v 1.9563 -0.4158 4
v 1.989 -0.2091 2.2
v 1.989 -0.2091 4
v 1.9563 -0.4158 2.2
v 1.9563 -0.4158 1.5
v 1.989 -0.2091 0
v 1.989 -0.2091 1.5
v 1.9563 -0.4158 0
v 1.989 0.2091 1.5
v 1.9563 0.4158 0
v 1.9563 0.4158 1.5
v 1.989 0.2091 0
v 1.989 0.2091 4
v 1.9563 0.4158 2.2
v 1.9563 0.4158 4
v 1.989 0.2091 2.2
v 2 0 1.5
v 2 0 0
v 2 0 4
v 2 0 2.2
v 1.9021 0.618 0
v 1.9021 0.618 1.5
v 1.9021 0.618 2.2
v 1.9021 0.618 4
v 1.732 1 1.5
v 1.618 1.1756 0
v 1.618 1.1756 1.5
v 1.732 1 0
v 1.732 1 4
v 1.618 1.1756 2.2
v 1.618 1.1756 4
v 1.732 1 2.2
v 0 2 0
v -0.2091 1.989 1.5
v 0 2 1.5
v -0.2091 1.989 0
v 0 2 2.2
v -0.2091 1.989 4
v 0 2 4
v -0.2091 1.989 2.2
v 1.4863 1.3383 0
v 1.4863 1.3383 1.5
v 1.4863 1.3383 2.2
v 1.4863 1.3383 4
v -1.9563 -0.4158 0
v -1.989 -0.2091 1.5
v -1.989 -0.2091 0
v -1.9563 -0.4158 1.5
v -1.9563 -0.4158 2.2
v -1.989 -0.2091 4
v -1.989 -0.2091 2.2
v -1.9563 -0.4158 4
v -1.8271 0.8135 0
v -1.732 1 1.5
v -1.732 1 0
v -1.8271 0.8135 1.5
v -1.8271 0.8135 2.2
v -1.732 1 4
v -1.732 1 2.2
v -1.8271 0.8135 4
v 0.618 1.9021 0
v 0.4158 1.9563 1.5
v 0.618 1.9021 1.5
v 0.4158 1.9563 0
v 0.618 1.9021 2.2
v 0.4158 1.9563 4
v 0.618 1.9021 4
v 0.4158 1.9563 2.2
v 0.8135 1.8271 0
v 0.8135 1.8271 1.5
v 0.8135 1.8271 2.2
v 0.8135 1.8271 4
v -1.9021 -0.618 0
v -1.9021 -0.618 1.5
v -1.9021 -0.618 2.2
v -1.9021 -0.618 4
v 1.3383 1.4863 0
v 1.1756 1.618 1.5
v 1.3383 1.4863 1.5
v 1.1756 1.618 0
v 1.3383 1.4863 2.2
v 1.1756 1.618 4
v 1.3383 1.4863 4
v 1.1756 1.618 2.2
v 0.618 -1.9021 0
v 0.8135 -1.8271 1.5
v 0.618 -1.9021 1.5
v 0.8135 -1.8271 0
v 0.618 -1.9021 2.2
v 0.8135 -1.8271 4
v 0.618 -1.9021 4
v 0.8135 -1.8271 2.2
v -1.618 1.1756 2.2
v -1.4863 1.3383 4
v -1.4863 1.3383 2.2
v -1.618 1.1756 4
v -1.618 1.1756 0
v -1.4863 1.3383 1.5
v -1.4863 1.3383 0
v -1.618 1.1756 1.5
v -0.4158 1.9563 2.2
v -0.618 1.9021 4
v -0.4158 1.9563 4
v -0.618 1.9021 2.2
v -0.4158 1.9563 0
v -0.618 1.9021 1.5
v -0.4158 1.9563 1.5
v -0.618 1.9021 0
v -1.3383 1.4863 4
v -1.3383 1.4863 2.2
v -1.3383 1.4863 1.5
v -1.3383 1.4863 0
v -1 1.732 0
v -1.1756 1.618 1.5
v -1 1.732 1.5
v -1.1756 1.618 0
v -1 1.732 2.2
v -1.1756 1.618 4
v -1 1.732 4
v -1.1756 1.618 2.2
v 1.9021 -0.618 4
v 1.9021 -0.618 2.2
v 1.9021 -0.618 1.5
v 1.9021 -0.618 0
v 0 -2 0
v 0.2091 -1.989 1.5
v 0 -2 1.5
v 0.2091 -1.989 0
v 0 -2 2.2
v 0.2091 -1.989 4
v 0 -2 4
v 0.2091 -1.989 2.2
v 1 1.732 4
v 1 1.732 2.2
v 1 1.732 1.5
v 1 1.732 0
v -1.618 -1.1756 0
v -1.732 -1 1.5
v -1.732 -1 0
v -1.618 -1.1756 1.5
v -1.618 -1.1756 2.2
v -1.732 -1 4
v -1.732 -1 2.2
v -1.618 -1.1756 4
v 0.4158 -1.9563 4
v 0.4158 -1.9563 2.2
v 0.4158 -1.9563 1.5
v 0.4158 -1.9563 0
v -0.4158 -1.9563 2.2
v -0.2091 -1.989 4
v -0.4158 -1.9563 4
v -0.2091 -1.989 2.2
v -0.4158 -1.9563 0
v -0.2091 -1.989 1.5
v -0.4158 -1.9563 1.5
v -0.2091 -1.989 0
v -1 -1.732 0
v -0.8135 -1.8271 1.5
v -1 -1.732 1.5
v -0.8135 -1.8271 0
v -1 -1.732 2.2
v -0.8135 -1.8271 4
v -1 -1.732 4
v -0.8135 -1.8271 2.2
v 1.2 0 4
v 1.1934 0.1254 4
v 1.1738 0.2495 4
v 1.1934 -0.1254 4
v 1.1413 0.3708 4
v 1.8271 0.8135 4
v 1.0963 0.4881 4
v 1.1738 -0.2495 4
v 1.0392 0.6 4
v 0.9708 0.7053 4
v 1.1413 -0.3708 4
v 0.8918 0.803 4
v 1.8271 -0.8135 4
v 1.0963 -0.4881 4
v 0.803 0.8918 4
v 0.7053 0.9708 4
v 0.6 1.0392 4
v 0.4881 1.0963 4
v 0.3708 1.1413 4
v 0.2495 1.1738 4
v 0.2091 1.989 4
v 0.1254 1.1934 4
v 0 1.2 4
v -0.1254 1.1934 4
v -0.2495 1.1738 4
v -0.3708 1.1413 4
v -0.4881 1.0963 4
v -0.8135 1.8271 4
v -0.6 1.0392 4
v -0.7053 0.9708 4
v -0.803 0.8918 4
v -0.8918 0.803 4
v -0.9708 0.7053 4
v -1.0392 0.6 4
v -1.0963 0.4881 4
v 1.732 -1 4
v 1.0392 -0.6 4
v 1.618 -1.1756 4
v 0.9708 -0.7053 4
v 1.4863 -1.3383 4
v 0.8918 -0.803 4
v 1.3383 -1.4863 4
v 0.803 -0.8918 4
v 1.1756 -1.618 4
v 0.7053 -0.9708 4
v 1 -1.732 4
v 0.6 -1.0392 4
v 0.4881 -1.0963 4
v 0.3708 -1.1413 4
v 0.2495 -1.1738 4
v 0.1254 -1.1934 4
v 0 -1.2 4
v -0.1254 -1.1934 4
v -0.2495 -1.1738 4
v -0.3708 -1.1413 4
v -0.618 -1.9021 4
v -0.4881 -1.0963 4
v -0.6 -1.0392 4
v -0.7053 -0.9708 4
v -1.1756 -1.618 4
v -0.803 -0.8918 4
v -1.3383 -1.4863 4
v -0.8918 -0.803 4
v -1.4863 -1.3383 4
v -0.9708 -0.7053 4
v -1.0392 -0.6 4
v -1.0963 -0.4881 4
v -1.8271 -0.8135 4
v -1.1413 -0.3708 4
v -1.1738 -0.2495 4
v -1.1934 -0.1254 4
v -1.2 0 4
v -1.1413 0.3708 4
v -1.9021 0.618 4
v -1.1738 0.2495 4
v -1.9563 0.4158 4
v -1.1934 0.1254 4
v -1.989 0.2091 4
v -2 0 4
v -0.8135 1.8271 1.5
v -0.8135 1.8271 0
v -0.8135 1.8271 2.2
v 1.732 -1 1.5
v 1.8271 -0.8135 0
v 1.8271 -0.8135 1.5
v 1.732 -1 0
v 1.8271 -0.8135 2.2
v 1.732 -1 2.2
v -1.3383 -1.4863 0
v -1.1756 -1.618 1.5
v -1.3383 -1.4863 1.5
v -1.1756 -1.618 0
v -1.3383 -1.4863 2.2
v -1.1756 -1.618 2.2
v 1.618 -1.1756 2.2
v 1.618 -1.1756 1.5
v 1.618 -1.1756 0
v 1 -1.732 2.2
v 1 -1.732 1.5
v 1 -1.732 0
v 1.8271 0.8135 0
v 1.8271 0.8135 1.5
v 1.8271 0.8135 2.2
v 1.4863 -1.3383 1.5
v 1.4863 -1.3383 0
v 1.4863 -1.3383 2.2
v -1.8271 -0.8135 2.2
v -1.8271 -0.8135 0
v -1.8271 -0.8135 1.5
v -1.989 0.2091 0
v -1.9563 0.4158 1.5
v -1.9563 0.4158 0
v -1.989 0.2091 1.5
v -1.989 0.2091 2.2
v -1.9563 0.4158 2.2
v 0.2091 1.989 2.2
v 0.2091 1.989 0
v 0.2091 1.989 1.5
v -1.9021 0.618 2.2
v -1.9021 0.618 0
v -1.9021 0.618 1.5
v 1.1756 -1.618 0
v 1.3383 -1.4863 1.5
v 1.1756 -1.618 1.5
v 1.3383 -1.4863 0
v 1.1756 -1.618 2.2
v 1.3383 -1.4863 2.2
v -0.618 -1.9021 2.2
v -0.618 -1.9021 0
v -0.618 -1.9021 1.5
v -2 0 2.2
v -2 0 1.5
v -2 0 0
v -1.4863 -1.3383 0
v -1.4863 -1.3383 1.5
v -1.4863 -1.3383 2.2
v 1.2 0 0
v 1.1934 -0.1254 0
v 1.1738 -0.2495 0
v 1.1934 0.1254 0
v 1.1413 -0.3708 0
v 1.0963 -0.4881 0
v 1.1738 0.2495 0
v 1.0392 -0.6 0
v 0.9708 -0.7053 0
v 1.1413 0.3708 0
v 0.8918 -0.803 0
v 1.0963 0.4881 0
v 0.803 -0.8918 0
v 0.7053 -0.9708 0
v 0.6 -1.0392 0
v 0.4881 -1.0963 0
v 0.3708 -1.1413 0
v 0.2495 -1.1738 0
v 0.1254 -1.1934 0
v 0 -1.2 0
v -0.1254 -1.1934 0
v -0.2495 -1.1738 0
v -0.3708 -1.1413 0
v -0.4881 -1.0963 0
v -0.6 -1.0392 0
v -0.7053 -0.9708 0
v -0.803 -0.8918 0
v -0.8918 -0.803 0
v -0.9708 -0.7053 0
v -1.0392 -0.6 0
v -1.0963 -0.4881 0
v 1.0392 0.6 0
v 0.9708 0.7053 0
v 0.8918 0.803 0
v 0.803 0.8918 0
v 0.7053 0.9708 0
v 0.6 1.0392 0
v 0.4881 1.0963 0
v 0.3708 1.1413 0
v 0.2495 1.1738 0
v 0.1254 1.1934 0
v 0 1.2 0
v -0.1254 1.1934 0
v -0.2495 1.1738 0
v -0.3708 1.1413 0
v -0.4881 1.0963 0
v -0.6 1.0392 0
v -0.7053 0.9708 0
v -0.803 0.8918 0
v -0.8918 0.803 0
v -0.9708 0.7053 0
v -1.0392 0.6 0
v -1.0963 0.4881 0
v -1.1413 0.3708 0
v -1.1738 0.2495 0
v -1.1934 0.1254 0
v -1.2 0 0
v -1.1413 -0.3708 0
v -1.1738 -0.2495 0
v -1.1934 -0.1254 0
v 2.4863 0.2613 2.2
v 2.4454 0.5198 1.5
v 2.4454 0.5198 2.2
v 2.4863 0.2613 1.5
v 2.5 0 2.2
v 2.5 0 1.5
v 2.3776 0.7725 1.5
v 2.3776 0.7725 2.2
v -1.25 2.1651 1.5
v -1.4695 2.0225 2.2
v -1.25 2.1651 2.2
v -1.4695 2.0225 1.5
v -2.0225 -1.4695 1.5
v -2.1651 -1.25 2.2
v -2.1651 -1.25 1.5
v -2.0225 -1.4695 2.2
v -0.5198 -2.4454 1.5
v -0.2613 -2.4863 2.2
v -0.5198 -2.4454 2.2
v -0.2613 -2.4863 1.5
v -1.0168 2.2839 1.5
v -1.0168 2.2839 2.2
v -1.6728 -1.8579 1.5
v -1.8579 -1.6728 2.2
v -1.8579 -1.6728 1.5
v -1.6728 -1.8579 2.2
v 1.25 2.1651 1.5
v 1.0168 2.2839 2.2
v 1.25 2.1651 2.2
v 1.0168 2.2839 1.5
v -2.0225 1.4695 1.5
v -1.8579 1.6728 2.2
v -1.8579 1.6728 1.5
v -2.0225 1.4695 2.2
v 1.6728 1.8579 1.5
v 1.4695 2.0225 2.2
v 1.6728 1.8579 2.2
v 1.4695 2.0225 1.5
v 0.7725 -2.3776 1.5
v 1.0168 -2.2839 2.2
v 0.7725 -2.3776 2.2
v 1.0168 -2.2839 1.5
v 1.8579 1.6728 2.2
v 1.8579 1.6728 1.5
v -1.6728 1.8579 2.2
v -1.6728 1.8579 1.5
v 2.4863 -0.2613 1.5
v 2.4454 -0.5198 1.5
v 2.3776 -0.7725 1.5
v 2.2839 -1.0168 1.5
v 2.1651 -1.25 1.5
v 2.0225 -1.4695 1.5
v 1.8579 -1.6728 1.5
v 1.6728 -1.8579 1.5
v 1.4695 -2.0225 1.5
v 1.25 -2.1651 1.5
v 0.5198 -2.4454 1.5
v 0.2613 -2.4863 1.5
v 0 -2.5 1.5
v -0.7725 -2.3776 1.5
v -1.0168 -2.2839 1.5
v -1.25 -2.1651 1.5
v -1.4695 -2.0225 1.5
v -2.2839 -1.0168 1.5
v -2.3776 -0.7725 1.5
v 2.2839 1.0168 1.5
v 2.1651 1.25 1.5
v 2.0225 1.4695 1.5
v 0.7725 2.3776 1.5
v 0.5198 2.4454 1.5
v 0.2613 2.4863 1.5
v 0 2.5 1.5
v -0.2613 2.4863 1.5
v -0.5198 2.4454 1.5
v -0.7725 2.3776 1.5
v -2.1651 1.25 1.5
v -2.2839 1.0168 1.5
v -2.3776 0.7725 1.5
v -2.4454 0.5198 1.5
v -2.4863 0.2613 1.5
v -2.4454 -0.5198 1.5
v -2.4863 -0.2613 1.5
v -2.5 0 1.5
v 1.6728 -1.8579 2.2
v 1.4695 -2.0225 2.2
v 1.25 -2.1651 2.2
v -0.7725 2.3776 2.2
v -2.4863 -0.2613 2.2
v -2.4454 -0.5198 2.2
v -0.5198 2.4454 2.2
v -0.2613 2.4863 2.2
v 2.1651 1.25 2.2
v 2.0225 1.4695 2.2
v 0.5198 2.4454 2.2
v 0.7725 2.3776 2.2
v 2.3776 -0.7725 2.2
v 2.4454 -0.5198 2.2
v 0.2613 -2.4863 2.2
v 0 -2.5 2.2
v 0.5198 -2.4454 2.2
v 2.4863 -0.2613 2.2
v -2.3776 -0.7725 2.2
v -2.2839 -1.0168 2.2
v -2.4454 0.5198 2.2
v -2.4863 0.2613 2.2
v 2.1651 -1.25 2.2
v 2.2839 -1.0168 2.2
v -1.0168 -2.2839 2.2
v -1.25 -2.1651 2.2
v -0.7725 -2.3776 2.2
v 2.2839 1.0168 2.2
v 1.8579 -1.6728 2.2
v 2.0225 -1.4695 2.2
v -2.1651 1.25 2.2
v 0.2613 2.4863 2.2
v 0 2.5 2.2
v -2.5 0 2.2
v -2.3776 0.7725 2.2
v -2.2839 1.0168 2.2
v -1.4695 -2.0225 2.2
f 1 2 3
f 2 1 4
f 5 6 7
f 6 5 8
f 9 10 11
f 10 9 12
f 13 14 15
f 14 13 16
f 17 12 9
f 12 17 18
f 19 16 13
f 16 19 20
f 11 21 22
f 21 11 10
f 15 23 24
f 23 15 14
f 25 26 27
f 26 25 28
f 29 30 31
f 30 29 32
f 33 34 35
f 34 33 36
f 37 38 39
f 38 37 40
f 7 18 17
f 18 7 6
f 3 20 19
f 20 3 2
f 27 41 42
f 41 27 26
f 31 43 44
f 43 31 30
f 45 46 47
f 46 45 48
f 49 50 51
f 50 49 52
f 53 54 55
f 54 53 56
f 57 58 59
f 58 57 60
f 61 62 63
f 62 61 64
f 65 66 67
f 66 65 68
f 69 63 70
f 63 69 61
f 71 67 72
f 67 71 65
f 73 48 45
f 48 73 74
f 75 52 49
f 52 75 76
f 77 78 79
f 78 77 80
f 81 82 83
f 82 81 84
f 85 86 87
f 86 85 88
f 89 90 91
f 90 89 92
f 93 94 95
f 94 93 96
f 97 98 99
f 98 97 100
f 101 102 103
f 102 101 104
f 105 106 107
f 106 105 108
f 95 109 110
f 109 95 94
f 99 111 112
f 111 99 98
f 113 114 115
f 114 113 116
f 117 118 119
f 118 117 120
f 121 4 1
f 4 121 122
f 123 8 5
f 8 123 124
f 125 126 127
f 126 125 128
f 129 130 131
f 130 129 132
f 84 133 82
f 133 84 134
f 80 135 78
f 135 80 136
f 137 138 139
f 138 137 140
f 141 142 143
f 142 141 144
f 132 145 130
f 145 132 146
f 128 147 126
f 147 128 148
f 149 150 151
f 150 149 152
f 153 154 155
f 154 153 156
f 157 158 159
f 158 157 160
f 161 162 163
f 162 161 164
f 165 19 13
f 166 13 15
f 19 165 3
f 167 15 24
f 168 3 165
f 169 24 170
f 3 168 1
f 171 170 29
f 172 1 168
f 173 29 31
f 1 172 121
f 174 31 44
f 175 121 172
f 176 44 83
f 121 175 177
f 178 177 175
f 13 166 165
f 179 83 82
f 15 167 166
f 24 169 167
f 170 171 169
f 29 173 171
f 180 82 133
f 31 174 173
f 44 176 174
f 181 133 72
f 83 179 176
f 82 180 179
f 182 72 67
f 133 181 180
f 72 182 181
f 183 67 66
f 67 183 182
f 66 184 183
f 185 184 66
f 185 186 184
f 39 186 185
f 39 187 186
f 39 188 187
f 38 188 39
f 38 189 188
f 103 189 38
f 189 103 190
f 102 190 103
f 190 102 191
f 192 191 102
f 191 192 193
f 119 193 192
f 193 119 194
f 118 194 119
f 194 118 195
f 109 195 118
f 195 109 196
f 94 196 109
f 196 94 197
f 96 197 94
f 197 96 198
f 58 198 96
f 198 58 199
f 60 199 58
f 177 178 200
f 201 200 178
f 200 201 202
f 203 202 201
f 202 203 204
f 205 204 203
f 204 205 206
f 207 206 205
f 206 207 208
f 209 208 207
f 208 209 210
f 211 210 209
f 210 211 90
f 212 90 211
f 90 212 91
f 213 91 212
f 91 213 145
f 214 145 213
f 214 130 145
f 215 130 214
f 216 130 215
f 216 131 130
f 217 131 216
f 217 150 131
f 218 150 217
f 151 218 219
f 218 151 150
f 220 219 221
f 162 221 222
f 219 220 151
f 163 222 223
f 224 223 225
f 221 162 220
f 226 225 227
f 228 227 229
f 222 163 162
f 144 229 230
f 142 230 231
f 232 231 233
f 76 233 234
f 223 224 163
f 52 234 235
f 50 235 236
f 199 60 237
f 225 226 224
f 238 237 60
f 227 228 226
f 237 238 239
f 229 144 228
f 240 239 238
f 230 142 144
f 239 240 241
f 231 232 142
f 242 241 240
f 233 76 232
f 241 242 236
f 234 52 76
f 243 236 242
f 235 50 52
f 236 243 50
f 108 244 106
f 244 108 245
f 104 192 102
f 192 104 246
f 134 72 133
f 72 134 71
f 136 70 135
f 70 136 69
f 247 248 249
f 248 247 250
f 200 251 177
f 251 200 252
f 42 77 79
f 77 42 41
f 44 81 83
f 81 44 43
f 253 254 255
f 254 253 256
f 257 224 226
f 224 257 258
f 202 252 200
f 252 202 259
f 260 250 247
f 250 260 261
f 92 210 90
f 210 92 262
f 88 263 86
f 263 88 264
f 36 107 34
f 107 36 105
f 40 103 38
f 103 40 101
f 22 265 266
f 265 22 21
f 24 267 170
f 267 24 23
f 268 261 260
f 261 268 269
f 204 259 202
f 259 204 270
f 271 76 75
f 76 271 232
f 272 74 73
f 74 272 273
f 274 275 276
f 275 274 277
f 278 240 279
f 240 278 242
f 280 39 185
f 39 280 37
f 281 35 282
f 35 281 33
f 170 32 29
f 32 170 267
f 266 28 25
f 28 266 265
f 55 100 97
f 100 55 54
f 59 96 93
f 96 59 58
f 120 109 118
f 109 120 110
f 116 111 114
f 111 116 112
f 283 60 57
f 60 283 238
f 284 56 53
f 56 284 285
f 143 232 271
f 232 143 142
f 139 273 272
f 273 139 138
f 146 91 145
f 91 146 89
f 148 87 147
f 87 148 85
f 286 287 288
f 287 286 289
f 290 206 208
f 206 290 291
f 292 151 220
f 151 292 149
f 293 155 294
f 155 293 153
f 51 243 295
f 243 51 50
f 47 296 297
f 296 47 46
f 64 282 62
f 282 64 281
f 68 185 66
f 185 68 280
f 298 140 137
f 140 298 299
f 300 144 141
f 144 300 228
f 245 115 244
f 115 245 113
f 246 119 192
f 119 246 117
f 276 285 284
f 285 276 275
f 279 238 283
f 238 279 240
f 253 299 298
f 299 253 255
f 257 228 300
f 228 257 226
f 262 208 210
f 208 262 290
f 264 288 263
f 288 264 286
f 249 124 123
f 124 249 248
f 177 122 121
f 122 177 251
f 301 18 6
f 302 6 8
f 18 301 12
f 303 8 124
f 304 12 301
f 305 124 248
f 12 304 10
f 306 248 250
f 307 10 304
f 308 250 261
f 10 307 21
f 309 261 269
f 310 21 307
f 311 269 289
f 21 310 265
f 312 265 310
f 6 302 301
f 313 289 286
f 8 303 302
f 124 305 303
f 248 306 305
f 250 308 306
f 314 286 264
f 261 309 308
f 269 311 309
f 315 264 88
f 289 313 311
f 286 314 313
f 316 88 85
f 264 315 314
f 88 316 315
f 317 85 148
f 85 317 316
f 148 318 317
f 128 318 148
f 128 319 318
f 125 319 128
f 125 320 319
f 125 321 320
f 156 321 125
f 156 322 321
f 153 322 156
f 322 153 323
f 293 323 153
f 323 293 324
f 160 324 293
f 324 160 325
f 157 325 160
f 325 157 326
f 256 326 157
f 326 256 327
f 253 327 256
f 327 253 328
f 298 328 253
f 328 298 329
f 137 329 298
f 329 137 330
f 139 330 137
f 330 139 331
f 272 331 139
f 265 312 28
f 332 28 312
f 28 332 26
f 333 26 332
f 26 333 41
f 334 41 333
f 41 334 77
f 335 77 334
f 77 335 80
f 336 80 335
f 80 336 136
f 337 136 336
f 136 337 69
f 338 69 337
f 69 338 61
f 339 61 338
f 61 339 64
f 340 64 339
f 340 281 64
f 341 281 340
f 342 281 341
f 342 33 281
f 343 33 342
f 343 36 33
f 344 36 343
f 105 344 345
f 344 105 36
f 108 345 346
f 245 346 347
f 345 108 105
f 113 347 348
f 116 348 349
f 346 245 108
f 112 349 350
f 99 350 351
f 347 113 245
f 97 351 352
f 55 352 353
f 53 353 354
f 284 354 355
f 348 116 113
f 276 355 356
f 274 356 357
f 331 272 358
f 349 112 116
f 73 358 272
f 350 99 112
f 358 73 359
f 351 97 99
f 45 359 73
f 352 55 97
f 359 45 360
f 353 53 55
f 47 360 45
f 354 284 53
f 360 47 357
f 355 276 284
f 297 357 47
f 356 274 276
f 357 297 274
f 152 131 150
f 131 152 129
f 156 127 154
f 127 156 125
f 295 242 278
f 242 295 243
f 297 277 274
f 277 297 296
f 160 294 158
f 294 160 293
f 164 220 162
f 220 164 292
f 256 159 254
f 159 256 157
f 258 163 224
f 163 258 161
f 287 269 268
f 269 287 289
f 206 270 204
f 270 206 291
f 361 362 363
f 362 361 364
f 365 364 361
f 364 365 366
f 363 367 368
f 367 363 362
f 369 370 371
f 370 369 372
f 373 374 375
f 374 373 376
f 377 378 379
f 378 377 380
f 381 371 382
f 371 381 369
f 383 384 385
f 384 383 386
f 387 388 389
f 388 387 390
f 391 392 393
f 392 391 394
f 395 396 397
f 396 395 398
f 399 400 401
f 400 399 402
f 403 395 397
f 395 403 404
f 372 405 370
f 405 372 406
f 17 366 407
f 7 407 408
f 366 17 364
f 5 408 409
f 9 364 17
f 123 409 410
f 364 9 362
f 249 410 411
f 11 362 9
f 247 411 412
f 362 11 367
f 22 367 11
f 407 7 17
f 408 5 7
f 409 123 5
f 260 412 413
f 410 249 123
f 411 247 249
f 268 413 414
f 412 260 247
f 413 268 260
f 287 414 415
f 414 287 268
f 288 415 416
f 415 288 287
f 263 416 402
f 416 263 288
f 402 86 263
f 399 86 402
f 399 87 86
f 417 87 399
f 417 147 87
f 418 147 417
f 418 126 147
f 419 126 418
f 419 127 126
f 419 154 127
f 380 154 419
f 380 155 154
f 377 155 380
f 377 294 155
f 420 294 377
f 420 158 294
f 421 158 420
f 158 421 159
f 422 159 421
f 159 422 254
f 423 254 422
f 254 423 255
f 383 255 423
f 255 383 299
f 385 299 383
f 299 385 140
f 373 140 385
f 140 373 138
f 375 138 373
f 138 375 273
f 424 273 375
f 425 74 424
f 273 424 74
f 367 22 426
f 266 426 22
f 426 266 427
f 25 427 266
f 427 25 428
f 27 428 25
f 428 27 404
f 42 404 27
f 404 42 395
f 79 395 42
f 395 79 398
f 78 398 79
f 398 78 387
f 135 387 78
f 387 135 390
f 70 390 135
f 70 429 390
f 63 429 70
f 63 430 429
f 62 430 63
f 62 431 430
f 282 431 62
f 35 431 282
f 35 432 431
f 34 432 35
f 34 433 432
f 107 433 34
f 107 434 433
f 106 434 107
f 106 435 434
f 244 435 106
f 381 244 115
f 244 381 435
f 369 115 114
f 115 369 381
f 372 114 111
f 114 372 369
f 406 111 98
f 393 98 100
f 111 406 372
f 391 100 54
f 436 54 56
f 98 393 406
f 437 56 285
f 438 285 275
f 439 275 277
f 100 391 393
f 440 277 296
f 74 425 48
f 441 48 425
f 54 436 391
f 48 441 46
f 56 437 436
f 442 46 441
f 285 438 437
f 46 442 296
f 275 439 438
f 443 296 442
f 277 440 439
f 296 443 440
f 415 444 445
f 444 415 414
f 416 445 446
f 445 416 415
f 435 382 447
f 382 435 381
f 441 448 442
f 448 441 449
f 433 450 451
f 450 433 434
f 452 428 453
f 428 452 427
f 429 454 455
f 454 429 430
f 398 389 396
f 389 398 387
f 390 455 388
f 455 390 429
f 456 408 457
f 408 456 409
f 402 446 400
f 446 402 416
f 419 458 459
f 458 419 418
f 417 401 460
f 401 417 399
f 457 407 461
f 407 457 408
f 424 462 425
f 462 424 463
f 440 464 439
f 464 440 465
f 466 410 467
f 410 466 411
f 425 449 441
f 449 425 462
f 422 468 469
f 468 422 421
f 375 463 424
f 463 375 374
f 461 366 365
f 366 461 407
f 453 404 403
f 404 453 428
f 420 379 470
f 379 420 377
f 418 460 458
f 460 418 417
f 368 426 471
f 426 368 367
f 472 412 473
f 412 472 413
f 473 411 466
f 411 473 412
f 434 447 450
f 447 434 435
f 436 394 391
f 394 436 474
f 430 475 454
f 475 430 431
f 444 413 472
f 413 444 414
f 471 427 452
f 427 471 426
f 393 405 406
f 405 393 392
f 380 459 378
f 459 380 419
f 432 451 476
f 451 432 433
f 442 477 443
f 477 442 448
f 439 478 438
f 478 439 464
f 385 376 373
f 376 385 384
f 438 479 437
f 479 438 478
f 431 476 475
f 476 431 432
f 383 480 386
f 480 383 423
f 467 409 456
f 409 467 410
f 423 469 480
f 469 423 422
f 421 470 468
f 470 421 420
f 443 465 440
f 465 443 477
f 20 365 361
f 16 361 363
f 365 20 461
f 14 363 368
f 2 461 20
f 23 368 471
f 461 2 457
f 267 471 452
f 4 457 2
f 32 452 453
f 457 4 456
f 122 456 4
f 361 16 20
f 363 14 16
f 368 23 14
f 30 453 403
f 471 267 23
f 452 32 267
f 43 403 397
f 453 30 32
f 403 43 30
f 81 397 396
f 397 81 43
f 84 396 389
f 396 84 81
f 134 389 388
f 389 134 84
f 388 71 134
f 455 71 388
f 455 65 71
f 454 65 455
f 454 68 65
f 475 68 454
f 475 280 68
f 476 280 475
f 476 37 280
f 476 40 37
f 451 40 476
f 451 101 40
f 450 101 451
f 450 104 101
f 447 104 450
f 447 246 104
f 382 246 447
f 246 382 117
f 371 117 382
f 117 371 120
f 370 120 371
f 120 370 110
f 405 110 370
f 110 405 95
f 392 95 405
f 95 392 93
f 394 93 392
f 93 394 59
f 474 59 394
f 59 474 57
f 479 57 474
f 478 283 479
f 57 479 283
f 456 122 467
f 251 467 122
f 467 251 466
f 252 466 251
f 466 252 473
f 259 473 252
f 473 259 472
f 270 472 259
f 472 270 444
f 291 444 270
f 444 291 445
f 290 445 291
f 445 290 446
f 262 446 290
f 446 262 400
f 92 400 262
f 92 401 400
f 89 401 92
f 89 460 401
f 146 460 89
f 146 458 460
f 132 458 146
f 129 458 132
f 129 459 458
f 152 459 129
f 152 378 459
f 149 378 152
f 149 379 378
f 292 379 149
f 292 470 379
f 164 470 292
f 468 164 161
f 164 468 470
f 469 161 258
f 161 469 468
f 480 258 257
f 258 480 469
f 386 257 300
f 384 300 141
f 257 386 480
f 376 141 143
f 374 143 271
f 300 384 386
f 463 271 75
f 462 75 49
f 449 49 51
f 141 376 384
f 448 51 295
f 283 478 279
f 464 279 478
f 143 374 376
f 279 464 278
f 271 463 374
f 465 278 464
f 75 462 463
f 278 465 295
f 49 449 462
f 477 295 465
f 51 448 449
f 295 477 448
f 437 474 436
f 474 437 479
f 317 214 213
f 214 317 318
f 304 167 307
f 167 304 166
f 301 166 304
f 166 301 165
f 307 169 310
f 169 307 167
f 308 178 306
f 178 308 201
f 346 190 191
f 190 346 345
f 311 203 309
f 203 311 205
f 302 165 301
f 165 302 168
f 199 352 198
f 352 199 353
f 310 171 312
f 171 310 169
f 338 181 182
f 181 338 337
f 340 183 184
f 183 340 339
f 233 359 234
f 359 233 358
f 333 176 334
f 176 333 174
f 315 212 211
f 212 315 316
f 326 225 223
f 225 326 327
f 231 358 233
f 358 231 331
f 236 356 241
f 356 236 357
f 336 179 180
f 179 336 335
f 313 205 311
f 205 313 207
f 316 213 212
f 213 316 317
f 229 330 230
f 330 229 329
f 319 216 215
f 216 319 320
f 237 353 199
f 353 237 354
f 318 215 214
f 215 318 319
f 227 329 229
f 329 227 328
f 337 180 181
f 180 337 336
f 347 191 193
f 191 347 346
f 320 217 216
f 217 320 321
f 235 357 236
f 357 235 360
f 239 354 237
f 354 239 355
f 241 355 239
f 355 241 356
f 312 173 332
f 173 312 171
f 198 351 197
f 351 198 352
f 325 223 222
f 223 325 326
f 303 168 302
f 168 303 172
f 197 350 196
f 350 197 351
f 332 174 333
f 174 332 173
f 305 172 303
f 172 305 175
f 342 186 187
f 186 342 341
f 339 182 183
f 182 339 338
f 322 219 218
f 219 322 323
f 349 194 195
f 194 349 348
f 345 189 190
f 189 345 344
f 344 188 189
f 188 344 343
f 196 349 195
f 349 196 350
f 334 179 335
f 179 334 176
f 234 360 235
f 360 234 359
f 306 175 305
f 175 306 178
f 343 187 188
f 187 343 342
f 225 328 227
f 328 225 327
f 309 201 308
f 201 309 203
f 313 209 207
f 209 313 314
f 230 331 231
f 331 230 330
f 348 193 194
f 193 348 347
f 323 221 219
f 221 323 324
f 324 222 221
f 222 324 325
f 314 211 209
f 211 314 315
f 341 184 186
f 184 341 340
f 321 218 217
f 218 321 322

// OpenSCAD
// Heat-set insert, simplified ribbed geometry.
$fn = 60;
eps = 0.02;
inner_d = 2.4;
outer_d = 4;
length = 4;
difference() {
    union() {
        cylinder(d=outer_d,h=length);
        for(z=[1.5:2:length-1]) translate([0,0,z]) cylinder(d=outer_d+1,h=0.7);
    }
    translate([0,0,-eps]) cylinder(d=inner_d,h=length+2*eps);
}
